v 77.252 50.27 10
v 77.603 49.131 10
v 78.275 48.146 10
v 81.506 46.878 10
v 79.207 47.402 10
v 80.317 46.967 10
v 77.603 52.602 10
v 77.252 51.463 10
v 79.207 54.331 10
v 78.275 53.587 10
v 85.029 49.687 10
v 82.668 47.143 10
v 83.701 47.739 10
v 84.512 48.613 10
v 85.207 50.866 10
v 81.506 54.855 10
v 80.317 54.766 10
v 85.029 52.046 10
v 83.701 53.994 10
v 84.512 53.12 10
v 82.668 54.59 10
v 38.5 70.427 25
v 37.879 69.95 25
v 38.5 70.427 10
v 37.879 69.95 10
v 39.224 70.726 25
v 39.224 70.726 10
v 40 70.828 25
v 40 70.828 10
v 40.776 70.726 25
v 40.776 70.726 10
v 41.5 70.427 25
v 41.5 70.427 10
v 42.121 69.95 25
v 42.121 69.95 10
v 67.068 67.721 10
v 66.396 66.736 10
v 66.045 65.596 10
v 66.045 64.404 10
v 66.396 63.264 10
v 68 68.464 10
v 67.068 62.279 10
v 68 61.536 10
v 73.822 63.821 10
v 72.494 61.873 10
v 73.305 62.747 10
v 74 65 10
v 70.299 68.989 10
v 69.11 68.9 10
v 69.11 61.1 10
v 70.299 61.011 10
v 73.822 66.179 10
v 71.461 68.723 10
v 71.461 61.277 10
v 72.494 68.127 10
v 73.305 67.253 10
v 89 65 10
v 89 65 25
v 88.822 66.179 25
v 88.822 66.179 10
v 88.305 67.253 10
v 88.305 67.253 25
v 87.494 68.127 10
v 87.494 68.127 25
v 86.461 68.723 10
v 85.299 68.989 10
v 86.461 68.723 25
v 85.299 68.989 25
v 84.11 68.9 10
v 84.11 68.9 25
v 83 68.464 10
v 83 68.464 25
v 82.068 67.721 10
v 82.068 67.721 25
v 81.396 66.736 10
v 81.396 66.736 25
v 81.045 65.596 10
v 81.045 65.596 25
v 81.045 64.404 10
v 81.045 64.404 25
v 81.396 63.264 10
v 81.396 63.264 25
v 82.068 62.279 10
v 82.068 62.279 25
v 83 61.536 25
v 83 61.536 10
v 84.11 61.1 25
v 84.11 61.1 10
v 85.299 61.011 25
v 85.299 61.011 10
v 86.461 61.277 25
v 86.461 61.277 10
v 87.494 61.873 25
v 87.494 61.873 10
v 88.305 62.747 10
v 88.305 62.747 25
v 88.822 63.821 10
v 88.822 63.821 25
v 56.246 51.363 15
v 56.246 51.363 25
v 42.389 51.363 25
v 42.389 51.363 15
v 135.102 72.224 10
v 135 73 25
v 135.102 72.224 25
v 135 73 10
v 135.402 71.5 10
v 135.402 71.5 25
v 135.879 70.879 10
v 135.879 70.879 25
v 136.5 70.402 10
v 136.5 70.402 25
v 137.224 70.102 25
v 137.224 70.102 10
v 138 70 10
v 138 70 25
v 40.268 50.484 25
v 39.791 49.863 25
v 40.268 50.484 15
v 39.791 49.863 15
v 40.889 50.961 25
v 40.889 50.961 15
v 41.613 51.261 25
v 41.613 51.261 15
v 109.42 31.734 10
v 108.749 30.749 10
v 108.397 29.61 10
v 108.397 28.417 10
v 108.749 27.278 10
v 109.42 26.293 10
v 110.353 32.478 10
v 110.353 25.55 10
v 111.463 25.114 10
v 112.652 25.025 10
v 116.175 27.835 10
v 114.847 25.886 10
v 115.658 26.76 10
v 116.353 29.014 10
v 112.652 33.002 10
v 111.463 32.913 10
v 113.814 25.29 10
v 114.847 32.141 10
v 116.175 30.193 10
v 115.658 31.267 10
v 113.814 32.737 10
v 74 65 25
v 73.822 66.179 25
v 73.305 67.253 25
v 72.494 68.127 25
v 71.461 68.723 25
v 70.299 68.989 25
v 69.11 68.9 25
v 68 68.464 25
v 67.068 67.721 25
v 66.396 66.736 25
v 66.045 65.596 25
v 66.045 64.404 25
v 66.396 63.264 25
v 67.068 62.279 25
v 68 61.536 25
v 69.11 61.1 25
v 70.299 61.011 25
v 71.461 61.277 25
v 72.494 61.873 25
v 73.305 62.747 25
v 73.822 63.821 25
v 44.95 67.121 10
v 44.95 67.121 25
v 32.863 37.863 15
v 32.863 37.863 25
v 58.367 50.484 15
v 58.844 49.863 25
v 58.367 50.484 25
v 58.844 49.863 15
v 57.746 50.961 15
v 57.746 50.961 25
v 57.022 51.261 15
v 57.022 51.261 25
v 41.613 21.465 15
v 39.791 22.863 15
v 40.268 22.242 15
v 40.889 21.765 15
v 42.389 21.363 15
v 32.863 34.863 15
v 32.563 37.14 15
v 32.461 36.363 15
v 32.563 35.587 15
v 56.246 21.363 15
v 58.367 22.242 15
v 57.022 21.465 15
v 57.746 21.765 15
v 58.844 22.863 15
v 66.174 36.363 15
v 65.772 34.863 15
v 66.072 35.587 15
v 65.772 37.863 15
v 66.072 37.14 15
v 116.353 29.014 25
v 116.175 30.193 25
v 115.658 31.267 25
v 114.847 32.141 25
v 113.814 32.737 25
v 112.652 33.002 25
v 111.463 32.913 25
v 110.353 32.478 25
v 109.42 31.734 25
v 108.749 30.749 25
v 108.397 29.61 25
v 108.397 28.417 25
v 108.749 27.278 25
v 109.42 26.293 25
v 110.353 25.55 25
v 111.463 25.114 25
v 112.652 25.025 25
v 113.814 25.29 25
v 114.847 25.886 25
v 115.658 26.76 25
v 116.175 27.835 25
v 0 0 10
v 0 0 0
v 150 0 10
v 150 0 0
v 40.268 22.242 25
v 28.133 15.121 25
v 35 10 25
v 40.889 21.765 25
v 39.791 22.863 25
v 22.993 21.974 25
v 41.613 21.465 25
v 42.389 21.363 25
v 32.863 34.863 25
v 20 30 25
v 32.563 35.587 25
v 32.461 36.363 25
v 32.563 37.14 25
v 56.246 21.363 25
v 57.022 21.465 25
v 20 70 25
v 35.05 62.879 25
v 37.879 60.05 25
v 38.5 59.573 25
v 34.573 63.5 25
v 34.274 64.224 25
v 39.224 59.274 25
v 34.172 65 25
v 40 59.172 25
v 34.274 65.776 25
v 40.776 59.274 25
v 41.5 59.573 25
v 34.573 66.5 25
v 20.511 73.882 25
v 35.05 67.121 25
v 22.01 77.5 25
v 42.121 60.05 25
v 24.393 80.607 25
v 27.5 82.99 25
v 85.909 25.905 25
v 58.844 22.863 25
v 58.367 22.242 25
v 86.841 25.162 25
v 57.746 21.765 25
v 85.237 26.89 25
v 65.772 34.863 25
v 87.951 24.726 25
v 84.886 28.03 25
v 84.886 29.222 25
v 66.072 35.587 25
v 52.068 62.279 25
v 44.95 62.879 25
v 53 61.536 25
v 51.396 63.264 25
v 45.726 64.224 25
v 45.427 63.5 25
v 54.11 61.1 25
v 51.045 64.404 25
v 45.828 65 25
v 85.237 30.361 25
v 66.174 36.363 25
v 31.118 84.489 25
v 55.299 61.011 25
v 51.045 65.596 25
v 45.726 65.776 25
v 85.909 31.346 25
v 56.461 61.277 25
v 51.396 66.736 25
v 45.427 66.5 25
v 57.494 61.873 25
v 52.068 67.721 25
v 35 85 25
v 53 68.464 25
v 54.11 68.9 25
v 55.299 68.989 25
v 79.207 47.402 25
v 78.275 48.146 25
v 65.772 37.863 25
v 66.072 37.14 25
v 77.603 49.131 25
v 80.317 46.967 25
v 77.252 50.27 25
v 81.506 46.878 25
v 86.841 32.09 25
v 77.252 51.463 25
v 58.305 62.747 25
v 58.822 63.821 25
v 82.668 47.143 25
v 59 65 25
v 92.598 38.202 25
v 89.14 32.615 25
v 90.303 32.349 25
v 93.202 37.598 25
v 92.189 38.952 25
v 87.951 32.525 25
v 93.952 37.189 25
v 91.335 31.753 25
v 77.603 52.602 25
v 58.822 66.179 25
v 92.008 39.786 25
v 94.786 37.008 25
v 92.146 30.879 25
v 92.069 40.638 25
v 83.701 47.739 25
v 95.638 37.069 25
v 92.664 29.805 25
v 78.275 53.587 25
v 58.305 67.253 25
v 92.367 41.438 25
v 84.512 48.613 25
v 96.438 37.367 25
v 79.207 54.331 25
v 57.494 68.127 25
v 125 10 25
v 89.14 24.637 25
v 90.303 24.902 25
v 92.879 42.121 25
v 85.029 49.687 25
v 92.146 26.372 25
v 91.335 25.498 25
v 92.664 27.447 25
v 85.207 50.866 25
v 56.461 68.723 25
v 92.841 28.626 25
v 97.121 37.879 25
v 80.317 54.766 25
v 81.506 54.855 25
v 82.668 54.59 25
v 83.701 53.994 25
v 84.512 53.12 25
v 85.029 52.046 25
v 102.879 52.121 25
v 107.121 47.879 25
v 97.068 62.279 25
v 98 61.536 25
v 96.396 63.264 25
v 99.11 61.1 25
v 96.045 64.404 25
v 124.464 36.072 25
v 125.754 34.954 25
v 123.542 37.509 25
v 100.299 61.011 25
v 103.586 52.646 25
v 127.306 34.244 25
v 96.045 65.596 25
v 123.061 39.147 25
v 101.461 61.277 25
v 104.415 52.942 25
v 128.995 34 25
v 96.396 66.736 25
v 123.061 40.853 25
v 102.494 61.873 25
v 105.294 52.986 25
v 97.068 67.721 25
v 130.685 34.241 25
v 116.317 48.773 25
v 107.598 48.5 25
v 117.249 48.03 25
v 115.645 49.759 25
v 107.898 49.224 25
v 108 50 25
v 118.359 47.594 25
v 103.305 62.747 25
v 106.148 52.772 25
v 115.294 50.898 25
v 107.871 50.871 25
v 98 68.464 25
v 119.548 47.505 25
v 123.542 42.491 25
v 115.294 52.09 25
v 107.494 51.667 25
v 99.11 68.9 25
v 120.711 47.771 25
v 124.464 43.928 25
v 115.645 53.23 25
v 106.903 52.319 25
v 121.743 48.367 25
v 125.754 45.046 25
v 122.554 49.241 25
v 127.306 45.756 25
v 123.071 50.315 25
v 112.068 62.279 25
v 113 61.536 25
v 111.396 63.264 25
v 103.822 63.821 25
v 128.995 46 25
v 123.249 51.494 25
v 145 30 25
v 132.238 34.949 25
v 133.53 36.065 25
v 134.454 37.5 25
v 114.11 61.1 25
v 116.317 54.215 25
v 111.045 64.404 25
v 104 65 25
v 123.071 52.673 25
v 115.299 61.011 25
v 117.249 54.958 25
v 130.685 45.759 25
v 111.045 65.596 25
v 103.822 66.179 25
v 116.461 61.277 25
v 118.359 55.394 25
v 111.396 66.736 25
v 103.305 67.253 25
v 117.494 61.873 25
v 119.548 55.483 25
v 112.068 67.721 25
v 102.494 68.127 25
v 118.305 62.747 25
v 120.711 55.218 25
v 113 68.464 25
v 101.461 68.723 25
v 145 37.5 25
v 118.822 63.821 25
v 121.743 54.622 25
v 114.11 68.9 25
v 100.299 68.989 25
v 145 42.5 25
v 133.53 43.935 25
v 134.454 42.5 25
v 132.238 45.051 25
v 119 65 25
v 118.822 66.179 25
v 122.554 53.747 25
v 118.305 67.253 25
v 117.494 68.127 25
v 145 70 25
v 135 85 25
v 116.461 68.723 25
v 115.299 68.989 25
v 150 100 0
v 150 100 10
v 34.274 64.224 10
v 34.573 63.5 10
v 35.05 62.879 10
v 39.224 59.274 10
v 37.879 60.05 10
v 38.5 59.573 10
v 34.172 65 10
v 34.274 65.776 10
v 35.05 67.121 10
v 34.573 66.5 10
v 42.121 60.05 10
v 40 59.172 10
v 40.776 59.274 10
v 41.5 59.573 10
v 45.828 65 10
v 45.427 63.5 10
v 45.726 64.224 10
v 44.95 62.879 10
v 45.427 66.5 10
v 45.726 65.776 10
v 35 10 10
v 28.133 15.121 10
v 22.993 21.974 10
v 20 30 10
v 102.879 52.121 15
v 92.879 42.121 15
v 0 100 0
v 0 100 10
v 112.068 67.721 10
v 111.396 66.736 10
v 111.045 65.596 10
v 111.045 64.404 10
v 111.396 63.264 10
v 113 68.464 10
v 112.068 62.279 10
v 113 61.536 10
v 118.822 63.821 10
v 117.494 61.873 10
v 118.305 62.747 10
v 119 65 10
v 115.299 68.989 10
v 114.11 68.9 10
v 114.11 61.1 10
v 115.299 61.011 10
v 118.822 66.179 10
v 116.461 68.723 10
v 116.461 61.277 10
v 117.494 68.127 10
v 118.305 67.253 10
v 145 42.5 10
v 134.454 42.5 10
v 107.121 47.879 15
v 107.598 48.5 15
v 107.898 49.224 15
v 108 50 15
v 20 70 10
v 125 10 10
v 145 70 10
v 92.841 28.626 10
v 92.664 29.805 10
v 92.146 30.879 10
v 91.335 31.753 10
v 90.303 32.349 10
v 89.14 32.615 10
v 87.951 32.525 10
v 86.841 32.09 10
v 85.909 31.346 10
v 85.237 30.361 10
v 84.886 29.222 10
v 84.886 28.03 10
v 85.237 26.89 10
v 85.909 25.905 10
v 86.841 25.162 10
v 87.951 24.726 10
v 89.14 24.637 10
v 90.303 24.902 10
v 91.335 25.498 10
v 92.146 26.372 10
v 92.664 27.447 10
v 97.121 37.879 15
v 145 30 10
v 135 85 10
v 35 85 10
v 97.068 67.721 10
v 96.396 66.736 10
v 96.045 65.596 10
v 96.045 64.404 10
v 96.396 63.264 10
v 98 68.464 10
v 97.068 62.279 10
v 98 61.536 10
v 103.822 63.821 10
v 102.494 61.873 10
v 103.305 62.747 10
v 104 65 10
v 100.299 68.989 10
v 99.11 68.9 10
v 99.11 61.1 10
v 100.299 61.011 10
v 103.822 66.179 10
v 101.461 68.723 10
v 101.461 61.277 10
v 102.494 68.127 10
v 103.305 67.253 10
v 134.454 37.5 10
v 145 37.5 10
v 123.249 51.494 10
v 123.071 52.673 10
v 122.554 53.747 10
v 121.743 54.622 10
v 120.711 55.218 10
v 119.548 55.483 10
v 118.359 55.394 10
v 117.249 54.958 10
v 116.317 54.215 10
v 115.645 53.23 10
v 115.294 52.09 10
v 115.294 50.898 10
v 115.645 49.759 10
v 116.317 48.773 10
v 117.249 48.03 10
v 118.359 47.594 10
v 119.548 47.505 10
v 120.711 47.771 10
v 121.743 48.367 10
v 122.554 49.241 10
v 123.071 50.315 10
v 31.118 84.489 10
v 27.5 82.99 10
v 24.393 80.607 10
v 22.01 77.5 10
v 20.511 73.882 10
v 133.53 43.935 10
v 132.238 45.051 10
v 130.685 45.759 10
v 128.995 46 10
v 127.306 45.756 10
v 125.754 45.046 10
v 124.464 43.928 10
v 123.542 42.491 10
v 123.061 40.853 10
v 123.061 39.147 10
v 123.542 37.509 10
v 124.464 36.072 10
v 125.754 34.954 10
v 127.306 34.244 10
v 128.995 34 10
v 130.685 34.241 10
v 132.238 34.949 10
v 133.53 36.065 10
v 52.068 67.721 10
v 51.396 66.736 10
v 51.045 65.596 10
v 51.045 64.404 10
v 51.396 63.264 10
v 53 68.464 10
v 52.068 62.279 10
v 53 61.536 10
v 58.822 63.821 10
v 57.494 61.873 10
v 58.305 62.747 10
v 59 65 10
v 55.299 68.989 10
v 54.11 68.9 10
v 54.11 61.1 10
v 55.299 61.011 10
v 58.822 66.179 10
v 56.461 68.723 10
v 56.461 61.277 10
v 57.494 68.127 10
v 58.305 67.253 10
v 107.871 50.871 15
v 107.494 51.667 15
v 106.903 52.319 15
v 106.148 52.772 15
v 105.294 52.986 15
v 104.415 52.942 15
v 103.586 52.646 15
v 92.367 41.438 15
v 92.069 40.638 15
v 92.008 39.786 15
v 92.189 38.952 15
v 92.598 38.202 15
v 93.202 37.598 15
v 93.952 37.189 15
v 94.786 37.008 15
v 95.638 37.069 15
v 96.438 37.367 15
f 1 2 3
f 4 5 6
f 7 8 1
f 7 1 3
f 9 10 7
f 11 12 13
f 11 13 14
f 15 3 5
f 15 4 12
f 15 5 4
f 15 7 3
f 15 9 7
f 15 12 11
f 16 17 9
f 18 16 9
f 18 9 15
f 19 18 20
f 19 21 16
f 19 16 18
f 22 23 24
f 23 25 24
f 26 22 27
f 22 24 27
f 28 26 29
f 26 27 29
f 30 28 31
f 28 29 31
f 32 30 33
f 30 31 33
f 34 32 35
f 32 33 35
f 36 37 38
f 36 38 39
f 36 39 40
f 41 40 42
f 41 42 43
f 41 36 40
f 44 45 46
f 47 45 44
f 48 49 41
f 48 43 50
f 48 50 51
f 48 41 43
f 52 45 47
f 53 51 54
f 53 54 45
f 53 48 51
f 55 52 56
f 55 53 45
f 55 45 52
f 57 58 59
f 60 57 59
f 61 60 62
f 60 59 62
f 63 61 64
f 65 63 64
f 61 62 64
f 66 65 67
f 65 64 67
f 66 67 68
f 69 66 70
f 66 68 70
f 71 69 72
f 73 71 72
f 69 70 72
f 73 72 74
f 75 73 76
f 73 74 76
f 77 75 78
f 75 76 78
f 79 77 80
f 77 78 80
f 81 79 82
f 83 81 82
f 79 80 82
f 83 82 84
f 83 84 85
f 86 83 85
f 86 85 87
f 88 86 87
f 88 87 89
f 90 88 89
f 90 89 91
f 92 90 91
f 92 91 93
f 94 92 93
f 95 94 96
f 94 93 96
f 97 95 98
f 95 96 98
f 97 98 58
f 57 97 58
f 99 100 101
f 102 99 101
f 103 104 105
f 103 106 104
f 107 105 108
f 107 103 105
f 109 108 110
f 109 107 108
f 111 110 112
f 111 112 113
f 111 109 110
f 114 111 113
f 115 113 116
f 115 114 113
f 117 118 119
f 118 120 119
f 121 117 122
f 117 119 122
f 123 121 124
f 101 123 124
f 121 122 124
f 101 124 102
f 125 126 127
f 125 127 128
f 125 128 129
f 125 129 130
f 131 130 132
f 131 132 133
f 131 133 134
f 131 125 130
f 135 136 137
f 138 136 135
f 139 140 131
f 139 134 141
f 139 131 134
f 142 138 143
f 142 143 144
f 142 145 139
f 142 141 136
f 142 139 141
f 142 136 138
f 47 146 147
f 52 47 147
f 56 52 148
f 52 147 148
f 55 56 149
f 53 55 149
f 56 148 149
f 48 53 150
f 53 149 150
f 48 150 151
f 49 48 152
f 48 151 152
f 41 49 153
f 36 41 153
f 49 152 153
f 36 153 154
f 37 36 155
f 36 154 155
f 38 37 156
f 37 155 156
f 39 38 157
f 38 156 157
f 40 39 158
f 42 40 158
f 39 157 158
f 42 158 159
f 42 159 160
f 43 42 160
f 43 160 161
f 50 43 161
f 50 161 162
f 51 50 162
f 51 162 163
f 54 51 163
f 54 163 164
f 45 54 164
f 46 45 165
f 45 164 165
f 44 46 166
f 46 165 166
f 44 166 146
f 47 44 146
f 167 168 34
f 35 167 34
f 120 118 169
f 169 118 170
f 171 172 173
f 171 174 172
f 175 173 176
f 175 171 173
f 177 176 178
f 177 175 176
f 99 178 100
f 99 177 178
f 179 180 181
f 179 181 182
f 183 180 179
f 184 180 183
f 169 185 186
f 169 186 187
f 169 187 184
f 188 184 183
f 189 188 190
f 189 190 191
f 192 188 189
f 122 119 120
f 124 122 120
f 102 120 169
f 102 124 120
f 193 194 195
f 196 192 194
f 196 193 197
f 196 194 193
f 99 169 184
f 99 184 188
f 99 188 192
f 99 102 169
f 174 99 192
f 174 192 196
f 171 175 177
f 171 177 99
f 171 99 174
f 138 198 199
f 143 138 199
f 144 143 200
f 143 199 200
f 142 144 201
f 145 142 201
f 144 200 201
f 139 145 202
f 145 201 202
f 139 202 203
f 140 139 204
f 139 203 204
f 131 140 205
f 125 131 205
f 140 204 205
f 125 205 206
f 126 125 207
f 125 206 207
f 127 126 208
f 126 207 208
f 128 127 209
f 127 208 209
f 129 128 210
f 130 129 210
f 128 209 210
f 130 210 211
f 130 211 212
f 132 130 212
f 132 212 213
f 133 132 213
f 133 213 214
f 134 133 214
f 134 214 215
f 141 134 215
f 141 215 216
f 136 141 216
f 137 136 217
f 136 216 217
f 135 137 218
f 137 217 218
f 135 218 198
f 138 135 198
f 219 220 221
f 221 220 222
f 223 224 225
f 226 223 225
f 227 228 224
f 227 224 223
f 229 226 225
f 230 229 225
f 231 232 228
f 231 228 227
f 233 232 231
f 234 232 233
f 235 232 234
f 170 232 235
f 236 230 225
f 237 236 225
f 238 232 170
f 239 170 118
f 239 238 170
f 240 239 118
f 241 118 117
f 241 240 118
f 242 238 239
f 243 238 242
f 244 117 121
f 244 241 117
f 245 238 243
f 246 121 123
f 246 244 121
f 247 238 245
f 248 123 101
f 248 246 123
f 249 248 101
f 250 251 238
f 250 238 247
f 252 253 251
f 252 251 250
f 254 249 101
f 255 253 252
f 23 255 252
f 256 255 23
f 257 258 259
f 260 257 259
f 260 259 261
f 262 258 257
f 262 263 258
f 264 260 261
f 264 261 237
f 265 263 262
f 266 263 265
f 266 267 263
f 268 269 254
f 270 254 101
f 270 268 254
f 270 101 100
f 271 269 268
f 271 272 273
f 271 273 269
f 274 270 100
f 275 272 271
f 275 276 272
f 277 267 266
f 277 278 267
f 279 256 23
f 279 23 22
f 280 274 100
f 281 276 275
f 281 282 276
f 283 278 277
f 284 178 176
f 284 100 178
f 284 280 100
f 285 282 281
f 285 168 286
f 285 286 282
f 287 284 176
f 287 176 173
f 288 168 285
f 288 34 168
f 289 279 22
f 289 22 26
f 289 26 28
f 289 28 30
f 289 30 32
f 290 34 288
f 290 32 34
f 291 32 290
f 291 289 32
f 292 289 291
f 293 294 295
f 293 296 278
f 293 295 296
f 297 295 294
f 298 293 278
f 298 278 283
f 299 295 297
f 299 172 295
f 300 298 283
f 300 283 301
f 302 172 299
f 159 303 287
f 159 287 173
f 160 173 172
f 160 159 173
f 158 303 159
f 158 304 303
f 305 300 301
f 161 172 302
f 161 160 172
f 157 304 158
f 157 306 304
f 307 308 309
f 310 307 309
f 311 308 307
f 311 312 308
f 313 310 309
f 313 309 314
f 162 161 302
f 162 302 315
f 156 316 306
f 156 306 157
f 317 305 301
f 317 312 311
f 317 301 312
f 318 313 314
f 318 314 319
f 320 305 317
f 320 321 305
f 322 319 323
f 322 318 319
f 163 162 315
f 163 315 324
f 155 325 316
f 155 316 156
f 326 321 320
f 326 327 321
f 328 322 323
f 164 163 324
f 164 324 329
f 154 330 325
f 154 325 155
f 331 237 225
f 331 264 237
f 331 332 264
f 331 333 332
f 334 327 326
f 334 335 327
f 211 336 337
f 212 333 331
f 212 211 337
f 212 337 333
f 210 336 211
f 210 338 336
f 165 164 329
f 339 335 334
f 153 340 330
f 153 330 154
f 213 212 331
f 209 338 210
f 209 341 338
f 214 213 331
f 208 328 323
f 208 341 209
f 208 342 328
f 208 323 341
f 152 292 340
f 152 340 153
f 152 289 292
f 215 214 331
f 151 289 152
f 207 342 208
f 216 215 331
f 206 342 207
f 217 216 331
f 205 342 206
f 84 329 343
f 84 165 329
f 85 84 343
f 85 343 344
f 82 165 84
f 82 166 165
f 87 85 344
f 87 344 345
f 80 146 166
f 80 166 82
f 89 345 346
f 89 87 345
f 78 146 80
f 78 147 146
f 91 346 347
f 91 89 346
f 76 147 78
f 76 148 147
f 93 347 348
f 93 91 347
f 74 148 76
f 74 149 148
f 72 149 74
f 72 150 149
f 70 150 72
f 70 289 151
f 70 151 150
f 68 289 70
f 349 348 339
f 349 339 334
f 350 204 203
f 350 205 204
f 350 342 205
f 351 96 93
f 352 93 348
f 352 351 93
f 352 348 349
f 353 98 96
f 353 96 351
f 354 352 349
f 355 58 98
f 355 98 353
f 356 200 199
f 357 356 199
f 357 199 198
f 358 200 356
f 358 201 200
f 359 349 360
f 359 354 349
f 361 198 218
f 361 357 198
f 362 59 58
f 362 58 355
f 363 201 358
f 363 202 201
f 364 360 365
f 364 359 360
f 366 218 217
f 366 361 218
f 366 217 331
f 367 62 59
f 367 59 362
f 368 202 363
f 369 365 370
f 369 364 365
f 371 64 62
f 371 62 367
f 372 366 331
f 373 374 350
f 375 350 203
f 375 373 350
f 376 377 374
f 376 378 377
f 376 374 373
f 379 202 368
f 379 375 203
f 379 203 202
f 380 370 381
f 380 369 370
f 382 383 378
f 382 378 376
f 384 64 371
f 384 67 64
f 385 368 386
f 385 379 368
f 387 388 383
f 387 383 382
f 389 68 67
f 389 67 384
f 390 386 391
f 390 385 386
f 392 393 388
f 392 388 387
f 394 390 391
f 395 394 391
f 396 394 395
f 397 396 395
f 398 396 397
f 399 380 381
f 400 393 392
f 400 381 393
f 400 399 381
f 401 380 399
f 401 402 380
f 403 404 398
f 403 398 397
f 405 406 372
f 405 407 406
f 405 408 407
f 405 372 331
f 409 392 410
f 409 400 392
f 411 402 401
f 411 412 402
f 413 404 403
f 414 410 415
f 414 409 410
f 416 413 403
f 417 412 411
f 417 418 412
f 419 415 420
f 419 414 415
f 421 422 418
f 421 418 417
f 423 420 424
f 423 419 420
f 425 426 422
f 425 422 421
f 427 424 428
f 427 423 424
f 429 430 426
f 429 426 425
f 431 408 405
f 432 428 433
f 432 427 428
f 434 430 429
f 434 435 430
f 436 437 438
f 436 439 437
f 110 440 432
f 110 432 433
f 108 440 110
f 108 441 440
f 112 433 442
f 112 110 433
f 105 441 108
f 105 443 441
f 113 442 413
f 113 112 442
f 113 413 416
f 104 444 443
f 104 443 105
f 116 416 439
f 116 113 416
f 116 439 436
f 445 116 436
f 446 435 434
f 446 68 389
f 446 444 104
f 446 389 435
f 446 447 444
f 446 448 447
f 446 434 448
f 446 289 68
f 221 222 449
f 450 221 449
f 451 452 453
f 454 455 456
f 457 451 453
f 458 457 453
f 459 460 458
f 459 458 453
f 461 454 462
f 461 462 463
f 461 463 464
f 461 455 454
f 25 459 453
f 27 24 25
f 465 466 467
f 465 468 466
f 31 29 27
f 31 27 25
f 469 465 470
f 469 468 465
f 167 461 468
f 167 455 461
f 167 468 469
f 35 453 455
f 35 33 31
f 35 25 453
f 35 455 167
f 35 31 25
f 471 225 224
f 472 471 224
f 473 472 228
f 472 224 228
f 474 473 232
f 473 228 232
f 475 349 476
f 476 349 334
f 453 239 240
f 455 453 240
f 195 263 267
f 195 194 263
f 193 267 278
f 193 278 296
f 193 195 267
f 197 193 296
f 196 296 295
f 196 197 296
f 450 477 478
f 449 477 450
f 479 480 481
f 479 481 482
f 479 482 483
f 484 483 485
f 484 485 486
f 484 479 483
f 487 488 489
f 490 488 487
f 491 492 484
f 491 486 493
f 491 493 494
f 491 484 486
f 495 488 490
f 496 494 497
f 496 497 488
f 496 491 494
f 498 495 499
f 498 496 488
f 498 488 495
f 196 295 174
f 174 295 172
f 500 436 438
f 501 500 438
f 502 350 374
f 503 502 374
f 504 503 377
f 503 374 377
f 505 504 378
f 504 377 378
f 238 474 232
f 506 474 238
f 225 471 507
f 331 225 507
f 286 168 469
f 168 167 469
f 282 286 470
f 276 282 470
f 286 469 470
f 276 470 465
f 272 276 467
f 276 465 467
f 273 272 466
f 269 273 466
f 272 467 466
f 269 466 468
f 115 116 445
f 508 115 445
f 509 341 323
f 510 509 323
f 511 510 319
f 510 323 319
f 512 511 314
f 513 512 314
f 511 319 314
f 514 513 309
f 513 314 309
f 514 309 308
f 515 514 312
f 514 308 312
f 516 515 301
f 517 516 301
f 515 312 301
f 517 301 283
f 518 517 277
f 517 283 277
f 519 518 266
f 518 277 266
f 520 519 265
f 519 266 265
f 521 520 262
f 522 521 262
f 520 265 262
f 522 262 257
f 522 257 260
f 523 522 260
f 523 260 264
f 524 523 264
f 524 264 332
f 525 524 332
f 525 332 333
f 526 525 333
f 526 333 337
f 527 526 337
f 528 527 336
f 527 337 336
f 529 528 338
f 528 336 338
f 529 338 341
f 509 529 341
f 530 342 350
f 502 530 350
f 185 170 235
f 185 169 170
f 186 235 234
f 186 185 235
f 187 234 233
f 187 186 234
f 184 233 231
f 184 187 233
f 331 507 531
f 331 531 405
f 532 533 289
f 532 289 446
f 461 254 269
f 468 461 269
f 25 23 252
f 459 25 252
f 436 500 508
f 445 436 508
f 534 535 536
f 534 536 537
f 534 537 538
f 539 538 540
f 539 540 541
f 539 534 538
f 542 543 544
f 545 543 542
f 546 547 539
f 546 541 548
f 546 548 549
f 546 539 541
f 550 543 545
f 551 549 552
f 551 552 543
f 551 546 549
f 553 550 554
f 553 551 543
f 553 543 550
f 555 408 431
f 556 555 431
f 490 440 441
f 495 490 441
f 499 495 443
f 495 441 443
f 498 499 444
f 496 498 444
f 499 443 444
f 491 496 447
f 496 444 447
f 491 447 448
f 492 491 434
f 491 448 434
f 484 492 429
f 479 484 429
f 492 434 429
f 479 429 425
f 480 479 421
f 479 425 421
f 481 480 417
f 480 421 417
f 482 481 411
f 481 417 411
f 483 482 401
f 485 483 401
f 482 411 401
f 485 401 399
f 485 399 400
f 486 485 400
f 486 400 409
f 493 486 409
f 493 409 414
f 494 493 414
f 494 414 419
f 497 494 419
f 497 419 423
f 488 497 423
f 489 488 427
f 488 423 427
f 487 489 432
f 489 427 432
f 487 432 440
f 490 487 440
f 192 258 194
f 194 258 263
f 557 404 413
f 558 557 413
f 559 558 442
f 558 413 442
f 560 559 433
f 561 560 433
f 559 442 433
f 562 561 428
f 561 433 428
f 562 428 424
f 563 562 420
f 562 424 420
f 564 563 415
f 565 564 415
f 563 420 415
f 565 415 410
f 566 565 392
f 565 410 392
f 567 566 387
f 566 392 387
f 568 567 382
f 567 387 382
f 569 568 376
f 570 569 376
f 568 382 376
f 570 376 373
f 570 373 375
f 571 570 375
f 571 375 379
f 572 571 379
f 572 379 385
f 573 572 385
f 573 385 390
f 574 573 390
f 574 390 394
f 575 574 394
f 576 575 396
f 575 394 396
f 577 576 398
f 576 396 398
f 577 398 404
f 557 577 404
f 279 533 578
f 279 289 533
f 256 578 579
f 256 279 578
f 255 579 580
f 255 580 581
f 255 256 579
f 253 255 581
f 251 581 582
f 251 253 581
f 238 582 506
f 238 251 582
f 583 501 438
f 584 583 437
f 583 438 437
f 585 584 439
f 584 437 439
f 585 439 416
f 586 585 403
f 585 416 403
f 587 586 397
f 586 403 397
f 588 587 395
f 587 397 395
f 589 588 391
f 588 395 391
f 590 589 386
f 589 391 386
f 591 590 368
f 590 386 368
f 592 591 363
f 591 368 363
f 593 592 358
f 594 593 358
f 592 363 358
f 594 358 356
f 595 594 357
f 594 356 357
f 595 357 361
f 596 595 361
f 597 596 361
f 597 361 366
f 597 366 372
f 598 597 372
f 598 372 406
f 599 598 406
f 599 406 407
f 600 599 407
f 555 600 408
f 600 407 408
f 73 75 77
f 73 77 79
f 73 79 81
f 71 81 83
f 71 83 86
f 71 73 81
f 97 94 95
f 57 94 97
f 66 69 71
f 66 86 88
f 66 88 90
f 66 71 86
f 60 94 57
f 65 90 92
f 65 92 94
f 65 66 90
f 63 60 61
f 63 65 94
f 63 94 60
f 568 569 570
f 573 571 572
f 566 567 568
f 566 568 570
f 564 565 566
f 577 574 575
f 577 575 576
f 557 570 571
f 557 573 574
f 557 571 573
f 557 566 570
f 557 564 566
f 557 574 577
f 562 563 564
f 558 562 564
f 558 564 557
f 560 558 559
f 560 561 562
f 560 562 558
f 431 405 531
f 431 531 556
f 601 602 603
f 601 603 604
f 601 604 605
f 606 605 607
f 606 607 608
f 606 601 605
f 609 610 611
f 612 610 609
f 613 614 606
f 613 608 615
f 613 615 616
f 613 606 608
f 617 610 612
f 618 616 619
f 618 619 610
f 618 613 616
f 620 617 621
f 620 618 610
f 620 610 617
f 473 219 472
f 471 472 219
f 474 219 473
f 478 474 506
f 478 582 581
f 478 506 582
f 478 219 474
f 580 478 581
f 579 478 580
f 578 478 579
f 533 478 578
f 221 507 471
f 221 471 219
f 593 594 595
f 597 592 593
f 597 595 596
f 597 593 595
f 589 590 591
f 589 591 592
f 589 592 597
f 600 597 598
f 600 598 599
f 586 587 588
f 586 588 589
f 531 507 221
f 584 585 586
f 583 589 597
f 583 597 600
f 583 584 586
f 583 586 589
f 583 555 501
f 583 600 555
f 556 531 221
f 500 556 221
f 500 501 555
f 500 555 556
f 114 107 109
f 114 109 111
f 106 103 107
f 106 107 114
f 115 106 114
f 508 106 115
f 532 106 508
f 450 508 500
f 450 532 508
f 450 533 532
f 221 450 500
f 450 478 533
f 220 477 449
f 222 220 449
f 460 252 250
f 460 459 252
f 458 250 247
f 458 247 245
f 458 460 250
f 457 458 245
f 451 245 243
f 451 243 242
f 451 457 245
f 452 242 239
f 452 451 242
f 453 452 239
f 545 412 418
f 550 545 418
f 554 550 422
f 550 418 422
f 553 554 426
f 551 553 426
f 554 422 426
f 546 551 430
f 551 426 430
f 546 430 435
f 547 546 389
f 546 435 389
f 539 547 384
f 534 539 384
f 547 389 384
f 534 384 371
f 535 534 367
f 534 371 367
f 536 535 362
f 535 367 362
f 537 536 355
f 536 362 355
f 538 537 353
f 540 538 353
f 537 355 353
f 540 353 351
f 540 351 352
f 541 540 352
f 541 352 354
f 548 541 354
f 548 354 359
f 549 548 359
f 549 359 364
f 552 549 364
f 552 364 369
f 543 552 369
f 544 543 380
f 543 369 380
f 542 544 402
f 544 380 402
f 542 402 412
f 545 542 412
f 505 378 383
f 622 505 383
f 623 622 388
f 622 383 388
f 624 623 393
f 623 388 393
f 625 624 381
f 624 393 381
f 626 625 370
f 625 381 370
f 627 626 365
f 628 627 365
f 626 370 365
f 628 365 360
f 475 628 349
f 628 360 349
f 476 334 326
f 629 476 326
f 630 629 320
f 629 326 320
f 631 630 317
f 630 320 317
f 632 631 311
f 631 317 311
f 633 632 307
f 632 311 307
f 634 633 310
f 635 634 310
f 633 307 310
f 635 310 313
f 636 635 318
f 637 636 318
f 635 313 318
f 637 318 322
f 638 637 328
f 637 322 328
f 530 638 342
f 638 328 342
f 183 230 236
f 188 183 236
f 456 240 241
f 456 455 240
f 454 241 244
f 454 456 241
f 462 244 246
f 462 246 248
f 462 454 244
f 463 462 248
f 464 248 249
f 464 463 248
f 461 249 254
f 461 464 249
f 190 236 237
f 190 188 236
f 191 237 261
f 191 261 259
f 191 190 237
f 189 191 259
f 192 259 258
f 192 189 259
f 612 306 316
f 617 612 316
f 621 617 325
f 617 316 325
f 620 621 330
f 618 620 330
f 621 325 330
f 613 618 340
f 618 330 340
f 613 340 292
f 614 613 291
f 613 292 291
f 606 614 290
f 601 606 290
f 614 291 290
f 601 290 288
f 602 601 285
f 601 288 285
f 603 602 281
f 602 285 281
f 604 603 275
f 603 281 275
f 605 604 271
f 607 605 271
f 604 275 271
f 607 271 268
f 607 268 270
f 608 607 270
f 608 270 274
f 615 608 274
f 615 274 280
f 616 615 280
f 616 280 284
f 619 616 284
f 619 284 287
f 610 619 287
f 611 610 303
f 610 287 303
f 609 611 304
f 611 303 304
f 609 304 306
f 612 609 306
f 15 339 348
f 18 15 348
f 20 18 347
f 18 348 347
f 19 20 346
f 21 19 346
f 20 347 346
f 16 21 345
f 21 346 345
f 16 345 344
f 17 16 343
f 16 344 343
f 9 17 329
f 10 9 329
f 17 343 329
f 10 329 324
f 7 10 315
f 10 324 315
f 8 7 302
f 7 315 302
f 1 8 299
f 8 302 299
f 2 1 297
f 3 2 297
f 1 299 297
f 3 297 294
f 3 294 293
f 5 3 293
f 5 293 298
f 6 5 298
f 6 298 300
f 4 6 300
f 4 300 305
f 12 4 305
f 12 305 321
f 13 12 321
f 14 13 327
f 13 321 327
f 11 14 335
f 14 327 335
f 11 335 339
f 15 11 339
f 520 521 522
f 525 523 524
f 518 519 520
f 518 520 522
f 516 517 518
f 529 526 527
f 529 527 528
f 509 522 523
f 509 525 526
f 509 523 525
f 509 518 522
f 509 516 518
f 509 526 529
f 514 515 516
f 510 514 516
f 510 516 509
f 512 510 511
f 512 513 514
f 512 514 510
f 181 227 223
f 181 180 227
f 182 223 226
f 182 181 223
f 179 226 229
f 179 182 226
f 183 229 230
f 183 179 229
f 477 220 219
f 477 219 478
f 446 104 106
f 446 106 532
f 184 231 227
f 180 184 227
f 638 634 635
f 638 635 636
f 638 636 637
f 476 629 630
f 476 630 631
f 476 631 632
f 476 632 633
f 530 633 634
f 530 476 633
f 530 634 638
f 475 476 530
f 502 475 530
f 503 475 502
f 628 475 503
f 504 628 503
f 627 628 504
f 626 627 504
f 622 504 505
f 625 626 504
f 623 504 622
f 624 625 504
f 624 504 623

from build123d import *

# Parameters (mm, degrees)
F1_W      = 150
F1_H      = 100
F2_DEPTH  = 10
F3_W      = 125
F3_H      = 75
F4_DEPTH  = 15
F5_R      = 15
F6_SIZE   = 20
F7_W      = 10
F7_H      = 15
F8_DEPTH  = 15
F10_DEPTH = 15
F11_R     = 4
F12_DEPTH = 15
F14_DEPTH = 15
F16_DEPTH = 15
F18_DEPTH = 10
F20_DEPTH = 10
F21_R     = 3
F22_R     = 3


with BuildPart() as f2:
    # F1 (on offset) → F2 (new body)
    with BuildSketch(Plane.XY):
        with Locations((75, 50)):
            Rectangle(F1_W, F1_H)
    extrude(amount=F2_DEPTH)

    # F3 (on face) → F4 (join)
    with BuildSketch(Plane.XY.offset(10)):
        with Locations((82.5, 47.5)):
            Rectangle(F3_W, F3_H)
    extrude(amount=F4_DEPTH)

    # F5
    f5_edges = [f2.edges().sort_by_distance(p)[0] for p in [
        (20, 85, 17.5),
    ]]
    fillet(f5_edges, radius=F5_R)

    # F6
    f6_edges = [f2.edges().sort_by_distance(p)[0] for p in [
        (145, 10, 17.5),
    ]]
    chamfer(f6_edges, length=F6_SIZE)

    # F7 (on face) → F8 (cut)
    with BuildSketch(Plane.XY.offset(25)):
        with Locations((140, 77.5)):
            Rectangle(F7_W, F7_H)
    extrude(amount=-F8_DEPTH, mode=Mode.SUBTRACT)

    # F9 (on face) → F10 (cut, through all)
    with BuildSketch(Plane.XY.offset(25)):
        with BuildLine():
            ThreePointArc((35, 10), (25.3174242293, 18.363068172), (20, 30))
            Line((20, 30), (20, 10))
            Line((20, 10), (35, 10))
        make_face()
    extrude(amount=-F10_DEPTH, mode=Mode.SUBTRACT)

    # F11 (on face) → F12 (cut)
    with BuildSketch(Plane.XY.offset(25)):
        with Locations((55, 65)):
            Circle(F11_R)
        with Locations((70, 65)):
            Circle(F11_R)
        with Locations((85, 65)):
            Circle(F11_R)
        with Locations((100, 65)):
            Circle(F11_R)
        with Locations((115, 65)):
            Circle(F11_R)
        with Locations((119.2491547178, 51.4941885379)):
            Circle(F11_R)
        with Locations((112.352680654, 29.0136292458)):
            Circle(F11_R)
        with Locations((88.8412705623, 28.6256909792)):
            Circle(F11_R)
        with Locations((81.206894066, 50.8664912371)):
            Circle(F11_R)
    extrude(amount=-F12_DEPTH, mode=Mode.SUBTRACT)

    # F13 (on face) → F14 (cut)
    with BuildSketch(Plane.XY.offset(25)):
        Polygon((40, 72.0710678119), (32.9289321881, 65), (40, 57.9289321881), (47.0710678119, 65), align=None)
    extrude(amount=-F14_DEPTH, mode=Mode.SUBTRACT)

    # F15 (on face) → F16 (cut)
    with BuildSketch(Plane.XY.offset(25)):
        with BuildLine():
            Line((134.4543560573, 37.5), (145, 37.5))
            Line((145, 37.5), (145, 42.5))
            Line((145, 42.5), (134.4543560573, 42.5))
            ThreePointArc((134.4543560573, 42.5), (134.8620020617, 41.2794263668), (135, 40))
            ThreePointArc((135, 40), (134.8620020617, 38.7205736332), (134.4543560573, 37.5))
        make_face()
        with BuildLine():
            ThreePointArc((134.4543560573, 42.5), (123, 40), (134.4543560573, 37.5))
            Line((134.4543560573, 37.5), (129, 37.5))
            Line((129, 37.5), (129, 42.5))
            Line((129, 42.5), (134.4543560573, 42.5))
        make_face()
        with BuildLine():
            Line((129, 37.5), (134.4543560573, 37.5))
            ThreePointArc((134.4543560573, 37.5), (134.8620020617, 38.7205736332), (135, 40))
            ThreePointArc((135, 40), (134.8620020617, 41.2794263668), (134.4543560573, 42.5))
            Line((134.4543560573, 42.5), (129, 42.5))
            Line((129, 42.5), (129, 37.5))
        make_face()
    extrude(amount=-F16_DEPTH, mode=Mode.SUBTRACT)

    # F17 (on face) → F18 (cut)
    with BuildSketch(Plane.XY.offset(25)):
        with BuildLine():
            Line((102.8786796564, 52.1213203436), (92.8786796564, 42.1213203436))
            ThreePointArc((92.8786796564, 42.1213203436), (96.1480502971, 42.7716385975), (98, 40))
            ThreePointArc((98, 40), (97.7716385975, 38.8519497029), (97.1213203436, 37.8786796564))
            Line((97.1213203436, 37.8786796564), (107.1213203436, 47.8786796564))
            ThreePointArc((107.1213203436, 47.8786796564), (102.8786796564, 47.8786796564), (102.8786796564, 52.1213203436))
        make_face()
        with BuildLine():
            ThreePointArc((98, 40), (96.1480502971, 42.7716385975), (92.8786796564, 42.1213203436))
            ThreePointArc((92.8786796564, 42.1213203436), (92.8786796564, 37.8786796564), (97.1213203436, 37.8786796564))
            ThreePointArc((97.1213203436, 37.8786796564), (97.7716385975, 38.8519497029), (98, 40))
        make_face()
        with BuildLine():
            ThreePointArc((108, 50), (106.1480502971, 52.7716385975), (102.8786796564, 52.1213203436))
            ThreePointArc((102.8786796564, 52.1213203436), (102.8786796564, 47.8786796564), (107.1213203436, 47.8786796564))
            ThreePointArc((107.1213203436, 47.8786796564), (107.7716385975, 48.8519497029), (108, 50))
        make_face()
    extrude(amount=-F18_DEPTH, mode=Mode.SUBTRACT)

    # F19 (on face) → F20 (cut)
    with BuildSketch(Plane.XY.offset(25)):
        Polygon((40.6571701914, 51.363068172), (31.9969161536, 36.363068172), (40.6571701914, 21.363068172), (57.9776782671, 21.363068172), (66.637932305, 36.363068172), (57.9776782671, 51.363068172), align=None)
    extrude(amount=-F20_DEPTH, mode=Mode.SUBTRACT)

    # F21
    f21_edges = [f2.edges().sort_by_distance(p)[0] for p in [
        (32.928932, 65, 17.5),
        (40, 72.071068, 17.5),
        (47.071068, 65, 17.5),
        (40, 57.928932, 17.5),
        (57.977678, 51.363068, 20),
        (40.65717, 51.363068, 20),
        (31.996916, 36.363068, 20),
        (40.65717, 21.363068, 20),
        (57.977678, 21.363068, 20),
        (66.637932, 36.363068, 20),
    ]]
    fillet(f21_edges, radius=F21_R)

    # F22
    f22_edges = [f2.edges().sort_by_distance(p)[0] for p in [
        (135, 70, 17.5),
    ]]
    fillet(f22_edges, radius=F22_R)


solid = f2.part
